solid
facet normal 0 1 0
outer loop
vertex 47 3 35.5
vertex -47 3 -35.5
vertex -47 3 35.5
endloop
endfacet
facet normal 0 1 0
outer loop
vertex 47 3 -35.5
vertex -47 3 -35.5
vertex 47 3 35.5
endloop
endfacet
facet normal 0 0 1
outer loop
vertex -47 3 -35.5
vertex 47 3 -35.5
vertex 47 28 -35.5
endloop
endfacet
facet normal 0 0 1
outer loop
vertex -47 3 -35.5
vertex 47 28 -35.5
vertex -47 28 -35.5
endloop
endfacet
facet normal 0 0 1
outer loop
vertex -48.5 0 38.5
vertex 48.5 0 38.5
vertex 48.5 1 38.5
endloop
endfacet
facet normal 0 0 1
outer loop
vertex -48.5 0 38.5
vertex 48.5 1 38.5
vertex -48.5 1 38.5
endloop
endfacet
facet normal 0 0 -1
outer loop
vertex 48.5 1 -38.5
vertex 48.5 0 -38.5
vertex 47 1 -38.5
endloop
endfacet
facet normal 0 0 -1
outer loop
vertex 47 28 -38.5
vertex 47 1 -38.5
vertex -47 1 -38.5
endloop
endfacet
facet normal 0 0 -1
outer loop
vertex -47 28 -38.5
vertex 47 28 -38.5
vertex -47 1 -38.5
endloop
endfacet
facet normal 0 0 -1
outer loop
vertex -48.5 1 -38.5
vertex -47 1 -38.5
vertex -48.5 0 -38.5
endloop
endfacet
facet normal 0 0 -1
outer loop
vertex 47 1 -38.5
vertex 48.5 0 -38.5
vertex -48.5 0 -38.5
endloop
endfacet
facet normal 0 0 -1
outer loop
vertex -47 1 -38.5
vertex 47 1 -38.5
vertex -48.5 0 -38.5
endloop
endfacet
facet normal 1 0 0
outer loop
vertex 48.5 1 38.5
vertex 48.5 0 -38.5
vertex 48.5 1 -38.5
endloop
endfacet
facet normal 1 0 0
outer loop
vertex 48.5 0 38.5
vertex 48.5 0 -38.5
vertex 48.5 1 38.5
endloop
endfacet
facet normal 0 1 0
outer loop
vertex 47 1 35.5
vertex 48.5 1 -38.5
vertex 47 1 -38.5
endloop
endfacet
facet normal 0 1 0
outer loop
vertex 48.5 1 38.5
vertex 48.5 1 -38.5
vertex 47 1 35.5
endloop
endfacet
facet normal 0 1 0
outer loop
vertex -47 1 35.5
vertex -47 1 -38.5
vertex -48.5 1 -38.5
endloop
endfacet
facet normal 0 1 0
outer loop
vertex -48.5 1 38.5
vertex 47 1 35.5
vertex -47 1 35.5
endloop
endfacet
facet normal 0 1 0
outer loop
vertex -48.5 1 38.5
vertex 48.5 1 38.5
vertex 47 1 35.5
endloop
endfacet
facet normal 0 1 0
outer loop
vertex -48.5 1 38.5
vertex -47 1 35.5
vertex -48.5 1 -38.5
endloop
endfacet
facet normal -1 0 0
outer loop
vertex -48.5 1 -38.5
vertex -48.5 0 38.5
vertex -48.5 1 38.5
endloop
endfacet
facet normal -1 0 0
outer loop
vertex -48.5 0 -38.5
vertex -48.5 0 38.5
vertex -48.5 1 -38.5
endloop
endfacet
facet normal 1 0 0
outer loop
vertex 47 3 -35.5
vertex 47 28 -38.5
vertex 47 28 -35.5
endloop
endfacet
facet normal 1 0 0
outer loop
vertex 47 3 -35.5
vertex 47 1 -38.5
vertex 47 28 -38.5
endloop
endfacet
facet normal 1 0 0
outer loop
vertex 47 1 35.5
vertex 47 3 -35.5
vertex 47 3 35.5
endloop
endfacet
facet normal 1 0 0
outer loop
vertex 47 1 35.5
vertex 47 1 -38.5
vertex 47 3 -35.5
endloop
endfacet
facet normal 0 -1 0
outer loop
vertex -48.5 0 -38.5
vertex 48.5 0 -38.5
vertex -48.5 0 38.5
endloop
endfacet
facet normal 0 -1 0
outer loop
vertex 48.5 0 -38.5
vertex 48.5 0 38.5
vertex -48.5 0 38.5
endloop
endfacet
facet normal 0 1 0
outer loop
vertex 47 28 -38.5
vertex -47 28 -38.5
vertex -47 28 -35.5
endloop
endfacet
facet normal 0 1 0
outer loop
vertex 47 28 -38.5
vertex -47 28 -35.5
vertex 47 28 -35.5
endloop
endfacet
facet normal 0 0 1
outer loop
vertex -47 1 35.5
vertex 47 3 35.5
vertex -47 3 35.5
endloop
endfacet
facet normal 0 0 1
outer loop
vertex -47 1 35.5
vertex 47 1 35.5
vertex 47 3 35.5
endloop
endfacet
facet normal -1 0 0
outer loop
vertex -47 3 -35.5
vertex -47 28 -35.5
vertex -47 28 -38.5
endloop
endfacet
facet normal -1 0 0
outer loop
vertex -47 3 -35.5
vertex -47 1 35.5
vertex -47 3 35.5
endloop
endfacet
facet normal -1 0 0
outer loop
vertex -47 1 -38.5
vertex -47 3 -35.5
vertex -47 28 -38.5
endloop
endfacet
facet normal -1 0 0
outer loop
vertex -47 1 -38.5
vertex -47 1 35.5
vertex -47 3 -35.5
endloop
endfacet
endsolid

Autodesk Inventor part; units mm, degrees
ref_plane "YZ Plane" through (0, 0, 0) normal (1, 0, 0) x (0, 1, 0)
ref_plane "XZ Plane" through (0, 0, 0) normal (0, 1, 0) x (-1, 0, 0)
ref_plane "XY Plane" through (0, 0, 0) normal (0, 0, 1) x (1, 0, 0)
sketch "Эскиз1" plane through (0, 0, 0) normal (0, 1, 0) x (-1, 0, 0)
  line L0 (-48.5, 38.5) -> (48.5, 38.5)
  line L1 (48.5, 38.5) -> (48.5, -38.5)
  line L2 (48.5, -38.5) -> (-48.5, -38.5)
  line L3 (-48.5, -38.5) -> (-48.5, 38.5)
  line L4 (-48.5, 38.5) -> (48.5, -38.5) construction
  line L5 (48.5, 38.5) -> (-48.5, -38.5) construction
  point P0 (0, 0)
  dimension "d0" = 77
  dimension "d1" = 97
extrude "Выдавливание1" add sketch "Эскиз1" along normal blind 1
sketch "Эскиз2" plane through (0, 1, 0) normal (0, 1, 0) x (1, 0, 0)
  line L0 (48.5, 38.5) -> (-48.5, 38.5) projected
  line L1 (-47, 38.5) -> (47, 38.5)
  line L2 (47, 38.5) -> (47, -35.5)
  line L3 (47, -35.5) -> (-47, -35.5)
  line L4 (-47, -35.5) -> (-47, 38.5)
  line L5 (0, 38.5) -> (0, 0)
  line L6 (-48.5, -38.5) -> (48.5, -38.5) projected
  dimension "d4" = 94
  dimension "d5" = 3
extrude "Выдавливание2" add sketch "Эскиз2" along normal blind 2
sketch "Эскиз3" plane through (0, 3, 0) normal (0, 1, 0) x (1, 0, 0)
  line L0 (47, 38.5) -> (-47, 38.5) projected
  line L1 (47, 38.5) -> (47, -35.5) projected
  line L2 (-47, 38.5) -> (47, 38.5)
  line L3 (47, 38.5) -> (47, 35.5)
  line L4 (47, 35.5) -> (-47, 35.5)
  line L5 (-47, 35.5) -> (-47, 38.5)
  point P0 (0, 0)
  dimension "d8" = 3
extrude "Выдавливание3" add sketch "Эскиз3" along normal blind 25
properties part number "Крышка Корпуса3"
